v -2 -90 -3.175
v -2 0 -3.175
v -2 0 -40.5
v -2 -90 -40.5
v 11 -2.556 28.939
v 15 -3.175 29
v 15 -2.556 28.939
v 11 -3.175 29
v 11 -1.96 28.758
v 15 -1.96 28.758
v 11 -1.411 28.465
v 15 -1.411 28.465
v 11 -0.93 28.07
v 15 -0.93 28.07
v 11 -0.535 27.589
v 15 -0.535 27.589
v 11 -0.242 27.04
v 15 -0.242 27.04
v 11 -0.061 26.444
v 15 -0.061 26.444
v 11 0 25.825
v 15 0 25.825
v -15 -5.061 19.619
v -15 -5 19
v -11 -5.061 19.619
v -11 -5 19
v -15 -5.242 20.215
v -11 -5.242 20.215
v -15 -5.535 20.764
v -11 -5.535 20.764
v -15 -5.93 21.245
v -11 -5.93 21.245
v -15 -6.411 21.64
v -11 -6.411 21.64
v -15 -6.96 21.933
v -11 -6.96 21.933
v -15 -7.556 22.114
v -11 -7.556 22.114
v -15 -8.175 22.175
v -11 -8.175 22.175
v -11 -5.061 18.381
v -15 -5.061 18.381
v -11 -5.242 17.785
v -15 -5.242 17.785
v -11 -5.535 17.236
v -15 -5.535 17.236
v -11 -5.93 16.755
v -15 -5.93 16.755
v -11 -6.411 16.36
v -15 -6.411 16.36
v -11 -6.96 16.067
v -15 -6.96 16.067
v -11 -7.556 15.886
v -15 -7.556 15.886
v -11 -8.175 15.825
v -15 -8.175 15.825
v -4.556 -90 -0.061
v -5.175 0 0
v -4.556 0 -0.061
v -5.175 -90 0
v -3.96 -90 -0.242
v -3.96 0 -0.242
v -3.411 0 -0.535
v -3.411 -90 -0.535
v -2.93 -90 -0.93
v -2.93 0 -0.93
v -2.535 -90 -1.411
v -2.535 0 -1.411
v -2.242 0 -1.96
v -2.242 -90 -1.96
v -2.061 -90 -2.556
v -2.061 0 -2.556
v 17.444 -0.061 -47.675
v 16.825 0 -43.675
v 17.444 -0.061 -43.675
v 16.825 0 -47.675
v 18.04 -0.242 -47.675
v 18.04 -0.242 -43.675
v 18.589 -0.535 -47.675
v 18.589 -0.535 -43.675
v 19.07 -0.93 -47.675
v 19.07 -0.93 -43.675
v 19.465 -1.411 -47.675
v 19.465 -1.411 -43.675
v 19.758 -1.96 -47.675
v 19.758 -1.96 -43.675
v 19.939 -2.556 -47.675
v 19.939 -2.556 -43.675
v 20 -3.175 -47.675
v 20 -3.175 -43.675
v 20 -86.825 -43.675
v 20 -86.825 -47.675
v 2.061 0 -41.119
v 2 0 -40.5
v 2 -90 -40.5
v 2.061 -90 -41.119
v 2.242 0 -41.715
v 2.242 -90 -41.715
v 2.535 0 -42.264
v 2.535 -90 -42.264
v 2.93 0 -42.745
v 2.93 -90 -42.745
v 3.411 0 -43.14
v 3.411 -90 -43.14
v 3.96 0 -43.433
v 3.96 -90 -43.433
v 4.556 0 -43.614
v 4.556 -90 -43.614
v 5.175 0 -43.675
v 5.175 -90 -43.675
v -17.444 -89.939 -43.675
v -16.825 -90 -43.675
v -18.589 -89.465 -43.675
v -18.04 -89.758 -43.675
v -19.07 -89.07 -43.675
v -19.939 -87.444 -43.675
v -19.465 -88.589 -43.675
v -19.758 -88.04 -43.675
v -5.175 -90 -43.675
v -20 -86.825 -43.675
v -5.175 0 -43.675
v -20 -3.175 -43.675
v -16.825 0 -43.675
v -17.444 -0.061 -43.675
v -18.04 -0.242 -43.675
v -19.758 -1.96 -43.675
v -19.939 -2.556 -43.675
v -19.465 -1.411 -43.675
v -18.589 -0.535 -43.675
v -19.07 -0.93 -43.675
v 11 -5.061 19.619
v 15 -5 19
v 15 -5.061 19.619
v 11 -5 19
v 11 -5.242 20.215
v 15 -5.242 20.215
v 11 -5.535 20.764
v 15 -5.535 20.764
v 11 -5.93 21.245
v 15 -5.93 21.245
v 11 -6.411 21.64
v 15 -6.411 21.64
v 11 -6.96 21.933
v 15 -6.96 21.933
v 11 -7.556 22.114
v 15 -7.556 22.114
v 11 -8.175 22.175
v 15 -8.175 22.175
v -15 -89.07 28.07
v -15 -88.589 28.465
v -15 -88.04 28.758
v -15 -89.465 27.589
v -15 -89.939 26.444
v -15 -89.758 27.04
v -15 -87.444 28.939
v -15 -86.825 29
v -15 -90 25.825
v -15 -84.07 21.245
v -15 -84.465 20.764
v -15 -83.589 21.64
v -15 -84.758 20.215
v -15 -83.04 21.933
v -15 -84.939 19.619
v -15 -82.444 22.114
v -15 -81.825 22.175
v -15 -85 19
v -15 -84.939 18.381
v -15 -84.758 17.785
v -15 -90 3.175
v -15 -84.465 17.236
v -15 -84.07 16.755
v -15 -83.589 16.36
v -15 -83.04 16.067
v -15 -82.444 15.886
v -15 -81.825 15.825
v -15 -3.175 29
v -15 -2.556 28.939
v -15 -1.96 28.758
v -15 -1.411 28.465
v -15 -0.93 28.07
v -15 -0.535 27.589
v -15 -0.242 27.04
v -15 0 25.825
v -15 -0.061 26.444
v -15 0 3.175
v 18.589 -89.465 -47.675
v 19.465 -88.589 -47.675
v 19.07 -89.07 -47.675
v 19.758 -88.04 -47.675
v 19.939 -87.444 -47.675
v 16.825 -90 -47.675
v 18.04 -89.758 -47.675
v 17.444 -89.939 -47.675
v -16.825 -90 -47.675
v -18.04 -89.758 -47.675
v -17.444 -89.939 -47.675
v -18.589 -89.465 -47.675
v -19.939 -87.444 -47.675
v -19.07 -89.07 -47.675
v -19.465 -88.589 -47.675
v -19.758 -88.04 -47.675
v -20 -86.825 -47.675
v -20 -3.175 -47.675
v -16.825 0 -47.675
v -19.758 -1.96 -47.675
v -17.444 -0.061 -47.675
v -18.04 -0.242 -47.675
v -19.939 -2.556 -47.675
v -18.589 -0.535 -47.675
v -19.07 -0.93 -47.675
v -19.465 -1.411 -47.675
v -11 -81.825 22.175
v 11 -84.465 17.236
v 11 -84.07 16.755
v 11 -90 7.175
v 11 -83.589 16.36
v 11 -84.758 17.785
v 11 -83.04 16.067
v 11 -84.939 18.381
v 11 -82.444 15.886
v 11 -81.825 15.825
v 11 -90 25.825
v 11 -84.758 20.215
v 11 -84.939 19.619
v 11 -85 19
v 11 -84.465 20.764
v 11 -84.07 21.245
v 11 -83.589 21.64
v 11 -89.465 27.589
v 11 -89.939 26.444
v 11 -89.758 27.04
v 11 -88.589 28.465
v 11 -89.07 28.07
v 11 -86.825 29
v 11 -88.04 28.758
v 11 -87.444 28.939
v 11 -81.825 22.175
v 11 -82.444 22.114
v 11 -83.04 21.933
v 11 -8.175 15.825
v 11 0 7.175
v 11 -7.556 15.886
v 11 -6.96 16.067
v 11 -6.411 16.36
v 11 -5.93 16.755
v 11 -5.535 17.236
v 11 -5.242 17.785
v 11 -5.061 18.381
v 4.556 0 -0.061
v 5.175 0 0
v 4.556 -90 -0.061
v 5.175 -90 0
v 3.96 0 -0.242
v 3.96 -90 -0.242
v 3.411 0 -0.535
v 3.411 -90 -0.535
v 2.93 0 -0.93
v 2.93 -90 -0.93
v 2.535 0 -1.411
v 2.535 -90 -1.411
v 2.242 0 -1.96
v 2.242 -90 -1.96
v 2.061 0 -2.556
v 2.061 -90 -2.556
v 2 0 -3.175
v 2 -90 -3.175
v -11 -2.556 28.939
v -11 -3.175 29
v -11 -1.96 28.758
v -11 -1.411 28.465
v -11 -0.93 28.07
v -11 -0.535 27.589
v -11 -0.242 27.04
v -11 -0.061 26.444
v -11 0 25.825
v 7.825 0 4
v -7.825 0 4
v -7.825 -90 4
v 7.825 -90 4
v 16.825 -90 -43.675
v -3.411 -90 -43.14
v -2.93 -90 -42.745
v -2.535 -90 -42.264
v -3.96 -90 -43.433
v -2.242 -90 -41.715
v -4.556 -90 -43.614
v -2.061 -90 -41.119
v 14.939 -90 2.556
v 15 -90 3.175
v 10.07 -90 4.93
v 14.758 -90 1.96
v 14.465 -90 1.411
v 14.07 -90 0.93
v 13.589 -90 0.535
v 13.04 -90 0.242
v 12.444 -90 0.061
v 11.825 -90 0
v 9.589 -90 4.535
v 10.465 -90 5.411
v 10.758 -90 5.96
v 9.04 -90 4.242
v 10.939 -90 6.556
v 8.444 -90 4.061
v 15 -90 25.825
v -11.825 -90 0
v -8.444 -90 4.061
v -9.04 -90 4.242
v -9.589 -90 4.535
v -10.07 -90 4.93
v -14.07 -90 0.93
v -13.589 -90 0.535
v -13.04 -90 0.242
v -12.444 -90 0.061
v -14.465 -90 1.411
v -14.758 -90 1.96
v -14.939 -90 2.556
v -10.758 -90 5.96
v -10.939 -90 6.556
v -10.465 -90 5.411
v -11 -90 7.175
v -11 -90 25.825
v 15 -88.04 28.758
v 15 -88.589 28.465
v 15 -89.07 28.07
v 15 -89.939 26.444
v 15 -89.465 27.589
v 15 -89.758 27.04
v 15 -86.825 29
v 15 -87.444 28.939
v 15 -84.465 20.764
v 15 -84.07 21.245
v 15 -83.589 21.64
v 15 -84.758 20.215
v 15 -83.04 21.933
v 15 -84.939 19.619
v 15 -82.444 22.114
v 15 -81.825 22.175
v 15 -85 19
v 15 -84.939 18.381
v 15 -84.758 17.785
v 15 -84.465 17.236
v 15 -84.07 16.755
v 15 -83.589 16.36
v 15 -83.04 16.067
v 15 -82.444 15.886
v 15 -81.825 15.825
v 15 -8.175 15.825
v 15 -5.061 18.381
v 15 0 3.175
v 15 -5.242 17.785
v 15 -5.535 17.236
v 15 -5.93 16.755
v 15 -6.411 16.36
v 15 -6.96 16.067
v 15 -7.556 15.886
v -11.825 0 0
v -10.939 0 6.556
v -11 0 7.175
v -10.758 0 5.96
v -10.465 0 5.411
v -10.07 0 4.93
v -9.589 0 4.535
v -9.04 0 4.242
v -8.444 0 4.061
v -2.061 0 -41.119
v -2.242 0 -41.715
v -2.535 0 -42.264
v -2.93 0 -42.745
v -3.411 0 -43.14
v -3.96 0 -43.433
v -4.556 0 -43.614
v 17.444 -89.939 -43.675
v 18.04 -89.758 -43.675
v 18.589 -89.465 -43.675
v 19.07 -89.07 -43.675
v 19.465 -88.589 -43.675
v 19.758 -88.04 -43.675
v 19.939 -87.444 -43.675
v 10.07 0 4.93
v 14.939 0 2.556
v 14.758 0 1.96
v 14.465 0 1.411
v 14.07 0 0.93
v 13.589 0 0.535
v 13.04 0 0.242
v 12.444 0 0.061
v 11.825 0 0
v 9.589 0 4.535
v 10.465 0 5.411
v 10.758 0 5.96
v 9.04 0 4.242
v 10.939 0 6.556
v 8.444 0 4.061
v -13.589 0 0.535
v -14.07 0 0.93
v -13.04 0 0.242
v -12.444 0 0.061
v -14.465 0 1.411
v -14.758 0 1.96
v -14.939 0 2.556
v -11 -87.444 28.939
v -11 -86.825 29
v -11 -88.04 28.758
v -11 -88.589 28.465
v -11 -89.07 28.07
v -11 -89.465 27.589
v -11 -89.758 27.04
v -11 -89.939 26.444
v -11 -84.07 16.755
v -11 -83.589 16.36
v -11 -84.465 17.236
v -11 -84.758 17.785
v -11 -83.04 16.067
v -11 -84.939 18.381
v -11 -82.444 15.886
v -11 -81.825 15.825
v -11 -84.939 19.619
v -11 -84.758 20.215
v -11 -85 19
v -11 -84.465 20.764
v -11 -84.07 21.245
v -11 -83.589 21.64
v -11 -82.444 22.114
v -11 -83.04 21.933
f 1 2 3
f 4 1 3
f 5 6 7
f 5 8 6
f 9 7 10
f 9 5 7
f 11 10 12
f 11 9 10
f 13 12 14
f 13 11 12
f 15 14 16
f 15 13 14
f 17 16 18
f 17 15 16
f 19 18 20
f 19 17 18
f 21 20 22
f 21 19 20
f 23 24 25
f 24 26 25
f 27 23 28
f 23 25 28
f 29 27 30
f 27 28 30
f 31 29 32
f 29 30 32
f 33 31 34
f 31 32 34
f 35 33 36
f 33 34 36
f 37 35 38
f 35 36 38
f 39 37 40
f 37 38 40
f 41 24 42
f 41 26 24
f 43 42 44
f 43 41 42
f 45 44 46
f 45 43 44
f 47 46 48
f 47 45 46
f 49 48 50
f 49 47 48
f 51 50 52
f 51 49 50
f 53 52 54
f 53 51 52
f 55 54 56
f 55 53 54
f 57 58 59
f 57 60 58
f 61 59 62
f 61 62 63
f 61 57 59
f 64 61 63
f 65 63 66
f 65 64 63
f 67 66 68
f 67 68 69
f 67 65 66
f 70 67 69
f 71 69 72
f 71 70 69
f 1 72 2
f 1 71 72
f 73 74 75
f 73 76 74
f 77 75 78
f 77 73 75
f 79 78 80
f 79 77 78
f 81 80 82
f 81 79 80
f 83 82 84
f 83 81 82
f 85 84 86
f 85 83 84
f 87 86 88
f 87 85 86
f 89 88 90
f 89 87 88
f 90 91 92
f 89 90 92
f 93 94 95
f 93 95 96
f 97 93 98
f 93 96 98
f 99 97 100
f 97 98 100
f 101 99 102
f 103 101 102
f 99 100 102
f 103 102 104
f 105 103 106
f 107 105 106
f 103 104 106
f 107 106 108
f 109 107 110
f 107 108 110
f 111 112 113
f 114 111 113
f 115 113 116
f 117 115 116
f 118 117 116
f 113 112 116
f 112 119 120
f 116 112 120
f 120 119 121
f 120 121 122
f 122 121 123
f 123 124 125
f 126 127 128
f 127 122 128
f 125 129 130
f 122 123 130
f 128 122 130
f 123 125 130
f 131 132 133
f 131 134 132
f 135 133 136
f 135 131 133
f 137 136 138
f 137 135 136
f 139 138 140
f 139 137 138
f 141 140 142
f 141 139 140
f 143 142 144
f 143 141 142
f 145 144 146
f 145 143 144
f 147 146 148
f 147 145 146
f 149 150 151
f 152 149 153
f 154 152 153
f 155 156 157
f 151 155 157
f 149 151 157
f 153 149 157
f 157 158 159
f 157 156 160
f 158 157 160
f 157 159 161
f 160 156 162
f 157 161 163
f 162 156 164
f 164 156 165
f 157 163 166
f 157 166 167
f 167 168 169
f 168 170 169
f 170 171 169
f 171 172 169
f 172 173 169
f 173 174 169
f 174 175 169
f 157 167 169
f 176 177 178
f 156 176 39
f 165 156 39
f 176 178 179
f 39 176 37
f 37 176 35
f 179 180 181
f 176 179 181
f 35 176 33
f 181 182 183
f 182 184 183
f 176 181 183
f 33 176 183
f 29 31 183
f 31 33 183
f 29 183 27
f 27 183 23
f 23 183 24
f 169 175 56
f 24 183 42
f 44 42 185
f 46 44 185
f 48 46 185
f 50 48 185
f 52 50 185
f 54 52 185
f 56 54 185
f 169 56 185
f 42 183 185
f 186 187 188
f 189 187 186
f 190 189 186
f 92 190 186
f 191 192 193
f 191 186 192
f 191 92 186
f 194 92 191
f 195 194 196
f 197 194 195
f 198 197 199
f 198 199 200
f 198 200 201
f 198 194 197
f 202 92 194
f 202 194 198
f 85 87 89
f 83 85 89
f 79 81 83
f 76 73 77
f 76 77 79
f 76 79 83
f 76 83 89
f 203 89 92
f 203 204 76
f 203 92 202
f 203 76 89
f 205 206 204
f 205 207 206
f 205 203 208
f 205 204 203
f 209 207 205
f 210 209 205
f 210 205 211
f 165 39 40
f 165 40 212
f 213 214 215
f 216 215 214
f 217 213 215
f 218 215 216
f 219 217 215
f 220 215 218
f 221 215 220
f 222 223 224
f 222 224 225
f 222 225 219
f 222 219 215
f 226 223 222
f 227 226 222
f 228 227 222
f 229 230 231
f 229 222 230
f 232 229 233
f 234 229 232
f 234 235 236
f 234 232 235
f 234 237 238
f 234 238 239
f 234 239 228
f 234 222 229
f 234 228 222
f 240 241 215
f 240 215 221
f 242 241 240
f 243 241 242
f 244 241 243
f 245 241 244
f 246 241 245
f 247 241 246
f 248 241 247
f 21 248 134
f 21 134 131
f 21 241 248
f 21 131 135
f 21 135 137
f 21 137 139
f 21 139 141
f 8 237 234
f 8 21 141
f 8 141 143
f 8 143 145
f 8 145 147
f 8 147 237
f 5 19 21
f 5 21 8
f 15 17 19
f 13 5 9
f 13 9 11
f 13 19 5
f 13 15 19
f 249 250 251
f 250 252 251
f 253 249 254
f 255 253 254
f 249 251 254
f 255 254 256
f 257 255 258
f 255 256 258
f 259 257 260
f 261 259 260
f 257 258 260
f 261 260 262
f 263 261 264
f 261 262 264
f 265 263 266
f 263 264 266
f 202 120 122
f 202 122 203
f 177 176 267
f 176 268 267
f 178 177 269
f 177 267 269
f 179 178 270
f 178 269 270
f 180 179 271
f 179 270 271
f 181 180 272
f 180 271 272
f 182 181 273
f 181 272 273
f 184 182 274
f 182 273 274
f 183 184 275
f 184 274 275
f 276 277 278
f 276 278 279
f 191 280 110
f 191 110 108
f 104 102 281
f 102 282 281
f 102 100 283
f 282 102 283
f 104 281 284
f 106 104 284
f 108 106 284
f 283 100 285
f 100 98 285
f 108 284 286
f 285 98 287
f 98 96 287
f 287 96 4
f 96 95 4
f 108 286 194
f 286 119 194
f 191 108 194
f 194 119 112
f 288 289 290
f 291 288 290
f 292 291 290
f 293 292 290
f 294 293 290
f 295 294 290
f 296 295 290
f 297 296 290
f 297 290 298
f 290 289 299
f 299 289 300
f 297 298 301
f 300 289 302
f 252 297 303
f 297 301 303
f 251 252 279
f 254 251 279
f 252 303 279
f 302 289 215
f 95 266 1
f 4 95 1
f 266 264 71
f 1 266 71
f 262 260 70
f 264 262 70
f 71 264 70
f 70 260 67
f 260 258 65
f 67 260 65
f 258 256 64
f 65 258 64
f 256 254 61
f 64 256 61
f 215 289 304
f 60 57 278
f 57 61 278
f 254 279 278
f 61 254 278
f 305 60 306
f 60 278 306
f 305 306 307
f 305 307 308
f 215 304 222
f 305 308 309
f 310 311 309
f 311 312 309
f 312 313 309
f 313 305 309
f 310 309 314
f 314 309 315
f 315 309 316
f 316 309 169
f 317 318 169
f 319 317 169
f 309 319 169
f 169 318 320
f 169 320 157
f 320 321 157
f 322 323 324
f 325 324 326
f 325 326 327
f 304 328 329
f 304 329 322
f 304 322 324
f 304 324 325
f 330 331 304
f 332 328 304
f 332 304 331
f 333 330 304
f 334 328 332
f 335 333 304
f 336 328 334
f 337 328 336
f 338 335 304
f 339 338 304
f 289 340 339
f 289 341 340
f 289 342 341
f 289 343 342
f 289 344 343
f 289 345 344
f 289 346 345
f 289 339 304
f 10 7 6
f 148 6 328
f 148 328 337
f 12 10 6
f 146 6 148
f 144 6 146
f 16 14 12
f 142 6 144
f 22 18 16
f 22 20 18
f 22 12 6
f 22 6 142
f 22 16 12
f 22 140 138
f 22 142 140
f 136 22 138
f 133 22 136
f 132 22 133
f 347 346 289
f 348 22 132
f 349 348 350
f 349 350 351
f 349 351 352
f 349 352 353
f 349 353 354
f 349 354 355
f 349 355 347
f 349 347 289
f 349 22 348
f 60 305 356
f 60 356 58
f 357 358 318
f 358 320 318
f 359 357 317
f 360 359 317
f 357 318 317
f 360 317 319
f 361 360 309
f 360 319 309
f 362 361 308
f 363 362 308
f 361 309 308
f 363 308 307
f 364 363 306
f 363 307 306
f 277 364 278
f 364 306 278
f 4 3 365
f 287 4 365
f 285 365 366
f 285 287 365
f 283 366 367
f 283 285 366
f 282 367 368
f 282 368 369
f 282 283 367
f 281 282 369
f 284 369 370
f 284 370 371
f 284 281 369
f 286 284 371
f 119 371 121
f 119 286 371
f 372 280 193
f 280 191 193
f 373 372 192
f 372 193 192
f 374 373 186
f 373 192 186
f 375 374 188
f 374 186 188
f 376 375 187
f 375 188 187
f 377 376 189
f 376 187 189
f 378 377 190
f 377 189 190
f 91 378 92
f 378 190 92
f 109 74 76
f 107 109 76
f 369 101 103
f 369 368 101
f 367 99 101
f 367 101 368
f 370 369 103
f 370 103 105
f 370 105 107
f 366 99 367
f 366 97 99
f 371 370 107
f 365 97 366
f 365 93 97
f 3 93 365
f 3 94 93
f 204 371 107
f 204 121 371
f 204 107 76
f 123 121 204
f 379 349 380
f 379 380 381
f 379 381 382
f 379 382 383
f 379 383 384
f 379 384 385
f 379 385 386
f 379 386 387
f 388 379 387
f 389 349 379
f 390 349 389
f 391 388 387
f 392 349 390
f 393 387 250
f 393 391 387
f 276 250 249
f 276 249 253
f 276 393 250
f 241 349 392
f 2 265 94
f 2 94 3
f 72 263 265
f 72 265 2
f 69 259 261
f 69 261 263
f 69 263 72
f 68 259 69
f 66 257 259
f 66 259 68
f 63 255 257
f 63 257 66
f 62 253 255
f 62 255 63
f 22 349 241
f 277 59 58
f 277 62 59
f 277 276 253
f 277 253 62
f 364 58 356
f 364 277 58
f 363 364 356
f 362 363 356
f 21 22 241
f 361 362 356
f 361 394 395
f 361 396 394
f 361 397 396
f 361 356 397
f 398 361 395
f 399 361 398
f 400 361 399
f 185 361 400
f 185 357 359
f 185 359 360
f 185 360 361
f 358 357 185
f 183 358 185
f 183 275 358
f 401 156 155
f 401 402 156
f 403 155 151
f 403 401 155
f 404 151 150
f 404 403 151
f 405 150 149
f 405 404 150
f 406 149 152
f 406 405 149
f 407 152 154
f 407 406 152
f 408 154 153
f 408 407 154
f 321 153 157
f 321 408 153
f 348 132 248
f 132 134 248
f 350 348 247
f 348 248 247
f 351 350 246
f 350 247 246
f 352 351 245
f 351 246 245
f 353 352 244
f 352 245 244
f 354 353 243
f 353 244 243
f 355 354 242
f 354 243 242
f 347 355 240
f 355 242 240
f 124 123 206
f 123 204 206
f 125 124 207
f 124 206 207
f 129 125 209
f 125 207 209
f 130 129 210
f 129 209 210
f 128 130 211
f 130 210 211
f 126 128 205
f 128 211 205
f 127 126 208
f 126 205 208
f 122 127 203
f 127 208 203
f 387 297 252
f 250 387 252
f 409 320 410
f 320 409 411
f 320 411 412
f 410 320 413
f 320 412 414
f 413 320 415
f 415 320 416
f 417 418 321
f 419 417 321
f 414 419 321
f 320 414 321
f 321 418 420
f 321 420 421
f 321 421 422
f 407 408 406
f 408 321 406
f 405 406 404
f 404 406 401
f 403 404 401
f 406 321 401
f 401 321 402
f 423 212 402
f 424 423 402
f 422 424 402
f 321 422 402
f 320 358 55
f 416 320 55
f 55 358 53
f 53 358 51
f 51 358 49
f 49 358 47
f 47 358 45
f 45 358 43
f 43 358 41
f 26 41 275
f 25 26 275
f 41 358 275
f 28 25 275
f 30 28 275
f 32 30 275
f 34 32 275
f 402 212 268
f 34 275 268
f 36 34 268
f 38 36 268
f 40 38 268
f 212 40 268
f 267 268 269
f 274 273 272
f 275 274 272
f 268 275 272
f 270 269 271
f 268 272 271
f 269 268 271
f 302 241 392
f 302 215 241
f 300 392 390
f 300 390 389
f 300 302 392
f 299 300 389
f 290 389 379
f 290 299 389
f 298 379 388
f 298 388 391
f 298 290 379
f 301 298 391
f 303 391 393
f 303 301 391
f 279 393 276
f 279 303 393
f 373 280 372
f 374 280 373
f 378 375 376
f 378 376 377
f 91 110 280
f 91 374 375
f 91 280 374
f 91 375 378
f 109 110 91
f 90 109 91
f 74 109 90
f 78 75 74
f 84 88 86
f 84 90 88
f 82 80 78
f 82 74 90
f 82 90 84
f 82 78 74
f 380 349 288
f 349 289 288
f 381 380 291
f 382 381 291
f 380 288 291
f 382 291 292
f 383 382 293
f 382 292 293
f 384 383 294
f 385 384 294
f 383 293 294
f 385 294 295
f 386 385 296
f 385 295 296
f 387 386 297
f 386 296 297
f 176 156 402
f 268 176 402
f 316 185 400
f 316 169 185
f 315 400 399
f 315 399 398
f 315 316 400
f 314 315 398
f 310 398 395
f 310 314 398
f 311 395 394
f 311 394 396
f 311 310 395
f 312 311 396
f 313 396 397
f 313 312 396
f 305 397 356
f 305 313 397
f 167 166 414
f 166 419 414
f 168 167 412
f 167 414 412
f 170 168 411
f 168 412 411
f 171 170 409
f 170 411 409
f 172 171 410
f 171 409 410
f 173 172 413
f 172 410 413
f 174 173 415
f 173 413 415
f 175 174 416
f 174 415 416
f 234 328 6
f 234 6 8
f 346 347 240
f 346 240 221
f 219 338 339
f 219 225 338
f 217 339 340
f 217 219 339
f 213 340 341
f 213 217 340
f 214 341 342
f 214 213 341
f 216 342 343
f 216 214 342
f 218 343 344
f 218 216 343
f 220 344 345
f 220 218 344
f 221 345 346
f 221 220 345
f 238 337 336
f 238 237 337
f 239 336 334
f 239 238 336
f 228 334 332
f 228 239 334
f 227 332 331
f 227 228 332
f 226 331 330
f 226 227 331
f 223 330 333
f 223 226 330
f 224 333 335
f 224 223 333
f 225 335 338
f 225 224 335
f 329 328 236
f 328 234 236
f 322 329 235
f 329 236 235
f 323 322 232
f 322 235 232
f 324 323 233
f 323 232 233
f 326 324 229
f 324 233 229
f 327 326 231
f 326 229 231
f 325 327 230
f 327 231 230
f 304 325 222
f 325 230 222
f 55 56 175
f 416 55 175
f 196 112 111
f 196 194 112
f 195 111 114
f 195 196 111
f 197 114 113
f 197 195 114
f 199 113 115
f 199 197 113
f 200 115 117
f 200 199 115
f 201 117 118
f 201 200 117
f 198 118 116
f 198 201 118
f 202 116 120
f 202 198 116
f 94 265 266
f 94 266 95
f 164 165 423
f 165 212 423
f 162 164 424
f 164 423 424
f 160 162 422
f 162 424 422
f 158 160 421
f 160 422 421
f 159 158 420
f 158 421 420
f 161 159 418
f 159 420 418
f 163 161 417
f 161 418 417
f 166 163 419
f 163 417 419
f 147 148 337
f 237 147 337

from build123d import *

# Parameters (mm, degrees)
F0_W     = 4
F0_H     = 4
F0_H_2   = 6
F1_DEPTH = 90
F2_W     = 80
F2_H     = 6.35
F3_DEPTH = 25
F4_R     = 3.17499


# Not quite as in the source:
# - a fillet or chamfer is up to 0.001 mm smaller than in the source, because OpenCascade refuses the exact size


with BuildPart() as f1:
    # F0 (on Front) → F1 (new body)
    with BuildSketch(Plane.XZ):
        with Locations((-13, 27)):
            Rectangle(F0_W, F0_H)
        with Locations((-13, 22)):
            Rectangle(F0_W, F0_H_2)
        Polygon((-11, 19), (-15, 19), (-15, 0), (-2, 0), (-2, -43.675), (-20, -43.675), (-20, -47.675), (0, -47.675), (0, 0), (0, 4), (-11, 4), align=None)
    extrude(amount=F1_DEPTH)

    # F2 (on face) → F3 (cut)
    with BuildSketch(Plane(origin=(-15, 0, 0), x_dir=(0, -1, 0), z_dir=(-1, 0, 0))):
        with Locations((45, 19)):
            Rectangle(F2_W, F2_H)
    extrude(amount=-F3_DEPTH, mode=Mode.SUBTRACT)

    # F4 (radius 3.175 in the source; OpenCascade refuses exactly that, so slightly less here)
    f4_edges = [f1.edges().sort_by_distance(p)[0] for p in [
        (-13, 0, 29),
        (-13, -90, 29),
        (-11, -45, 4),
        (-15, -45, 0),
        (-20, 0, -45.675),
        (-20, -90, -45.675),
        (-13, -85, 22.175),
        (-13, -85, 15.825),
        (-13, -5, 15.825),
        (-13, -5, 22.175),
        (-2, -45, -43.675),
        (-2, -45, 0),
    ]]
    fillet(f4_edges, radius=F4_R)

    # F5: F1 across plane


with BuildPart() as f1_1:
    add(f1.part)
    add(f1.part.mirror(Plane.YZ))


solid = f1_1.part
